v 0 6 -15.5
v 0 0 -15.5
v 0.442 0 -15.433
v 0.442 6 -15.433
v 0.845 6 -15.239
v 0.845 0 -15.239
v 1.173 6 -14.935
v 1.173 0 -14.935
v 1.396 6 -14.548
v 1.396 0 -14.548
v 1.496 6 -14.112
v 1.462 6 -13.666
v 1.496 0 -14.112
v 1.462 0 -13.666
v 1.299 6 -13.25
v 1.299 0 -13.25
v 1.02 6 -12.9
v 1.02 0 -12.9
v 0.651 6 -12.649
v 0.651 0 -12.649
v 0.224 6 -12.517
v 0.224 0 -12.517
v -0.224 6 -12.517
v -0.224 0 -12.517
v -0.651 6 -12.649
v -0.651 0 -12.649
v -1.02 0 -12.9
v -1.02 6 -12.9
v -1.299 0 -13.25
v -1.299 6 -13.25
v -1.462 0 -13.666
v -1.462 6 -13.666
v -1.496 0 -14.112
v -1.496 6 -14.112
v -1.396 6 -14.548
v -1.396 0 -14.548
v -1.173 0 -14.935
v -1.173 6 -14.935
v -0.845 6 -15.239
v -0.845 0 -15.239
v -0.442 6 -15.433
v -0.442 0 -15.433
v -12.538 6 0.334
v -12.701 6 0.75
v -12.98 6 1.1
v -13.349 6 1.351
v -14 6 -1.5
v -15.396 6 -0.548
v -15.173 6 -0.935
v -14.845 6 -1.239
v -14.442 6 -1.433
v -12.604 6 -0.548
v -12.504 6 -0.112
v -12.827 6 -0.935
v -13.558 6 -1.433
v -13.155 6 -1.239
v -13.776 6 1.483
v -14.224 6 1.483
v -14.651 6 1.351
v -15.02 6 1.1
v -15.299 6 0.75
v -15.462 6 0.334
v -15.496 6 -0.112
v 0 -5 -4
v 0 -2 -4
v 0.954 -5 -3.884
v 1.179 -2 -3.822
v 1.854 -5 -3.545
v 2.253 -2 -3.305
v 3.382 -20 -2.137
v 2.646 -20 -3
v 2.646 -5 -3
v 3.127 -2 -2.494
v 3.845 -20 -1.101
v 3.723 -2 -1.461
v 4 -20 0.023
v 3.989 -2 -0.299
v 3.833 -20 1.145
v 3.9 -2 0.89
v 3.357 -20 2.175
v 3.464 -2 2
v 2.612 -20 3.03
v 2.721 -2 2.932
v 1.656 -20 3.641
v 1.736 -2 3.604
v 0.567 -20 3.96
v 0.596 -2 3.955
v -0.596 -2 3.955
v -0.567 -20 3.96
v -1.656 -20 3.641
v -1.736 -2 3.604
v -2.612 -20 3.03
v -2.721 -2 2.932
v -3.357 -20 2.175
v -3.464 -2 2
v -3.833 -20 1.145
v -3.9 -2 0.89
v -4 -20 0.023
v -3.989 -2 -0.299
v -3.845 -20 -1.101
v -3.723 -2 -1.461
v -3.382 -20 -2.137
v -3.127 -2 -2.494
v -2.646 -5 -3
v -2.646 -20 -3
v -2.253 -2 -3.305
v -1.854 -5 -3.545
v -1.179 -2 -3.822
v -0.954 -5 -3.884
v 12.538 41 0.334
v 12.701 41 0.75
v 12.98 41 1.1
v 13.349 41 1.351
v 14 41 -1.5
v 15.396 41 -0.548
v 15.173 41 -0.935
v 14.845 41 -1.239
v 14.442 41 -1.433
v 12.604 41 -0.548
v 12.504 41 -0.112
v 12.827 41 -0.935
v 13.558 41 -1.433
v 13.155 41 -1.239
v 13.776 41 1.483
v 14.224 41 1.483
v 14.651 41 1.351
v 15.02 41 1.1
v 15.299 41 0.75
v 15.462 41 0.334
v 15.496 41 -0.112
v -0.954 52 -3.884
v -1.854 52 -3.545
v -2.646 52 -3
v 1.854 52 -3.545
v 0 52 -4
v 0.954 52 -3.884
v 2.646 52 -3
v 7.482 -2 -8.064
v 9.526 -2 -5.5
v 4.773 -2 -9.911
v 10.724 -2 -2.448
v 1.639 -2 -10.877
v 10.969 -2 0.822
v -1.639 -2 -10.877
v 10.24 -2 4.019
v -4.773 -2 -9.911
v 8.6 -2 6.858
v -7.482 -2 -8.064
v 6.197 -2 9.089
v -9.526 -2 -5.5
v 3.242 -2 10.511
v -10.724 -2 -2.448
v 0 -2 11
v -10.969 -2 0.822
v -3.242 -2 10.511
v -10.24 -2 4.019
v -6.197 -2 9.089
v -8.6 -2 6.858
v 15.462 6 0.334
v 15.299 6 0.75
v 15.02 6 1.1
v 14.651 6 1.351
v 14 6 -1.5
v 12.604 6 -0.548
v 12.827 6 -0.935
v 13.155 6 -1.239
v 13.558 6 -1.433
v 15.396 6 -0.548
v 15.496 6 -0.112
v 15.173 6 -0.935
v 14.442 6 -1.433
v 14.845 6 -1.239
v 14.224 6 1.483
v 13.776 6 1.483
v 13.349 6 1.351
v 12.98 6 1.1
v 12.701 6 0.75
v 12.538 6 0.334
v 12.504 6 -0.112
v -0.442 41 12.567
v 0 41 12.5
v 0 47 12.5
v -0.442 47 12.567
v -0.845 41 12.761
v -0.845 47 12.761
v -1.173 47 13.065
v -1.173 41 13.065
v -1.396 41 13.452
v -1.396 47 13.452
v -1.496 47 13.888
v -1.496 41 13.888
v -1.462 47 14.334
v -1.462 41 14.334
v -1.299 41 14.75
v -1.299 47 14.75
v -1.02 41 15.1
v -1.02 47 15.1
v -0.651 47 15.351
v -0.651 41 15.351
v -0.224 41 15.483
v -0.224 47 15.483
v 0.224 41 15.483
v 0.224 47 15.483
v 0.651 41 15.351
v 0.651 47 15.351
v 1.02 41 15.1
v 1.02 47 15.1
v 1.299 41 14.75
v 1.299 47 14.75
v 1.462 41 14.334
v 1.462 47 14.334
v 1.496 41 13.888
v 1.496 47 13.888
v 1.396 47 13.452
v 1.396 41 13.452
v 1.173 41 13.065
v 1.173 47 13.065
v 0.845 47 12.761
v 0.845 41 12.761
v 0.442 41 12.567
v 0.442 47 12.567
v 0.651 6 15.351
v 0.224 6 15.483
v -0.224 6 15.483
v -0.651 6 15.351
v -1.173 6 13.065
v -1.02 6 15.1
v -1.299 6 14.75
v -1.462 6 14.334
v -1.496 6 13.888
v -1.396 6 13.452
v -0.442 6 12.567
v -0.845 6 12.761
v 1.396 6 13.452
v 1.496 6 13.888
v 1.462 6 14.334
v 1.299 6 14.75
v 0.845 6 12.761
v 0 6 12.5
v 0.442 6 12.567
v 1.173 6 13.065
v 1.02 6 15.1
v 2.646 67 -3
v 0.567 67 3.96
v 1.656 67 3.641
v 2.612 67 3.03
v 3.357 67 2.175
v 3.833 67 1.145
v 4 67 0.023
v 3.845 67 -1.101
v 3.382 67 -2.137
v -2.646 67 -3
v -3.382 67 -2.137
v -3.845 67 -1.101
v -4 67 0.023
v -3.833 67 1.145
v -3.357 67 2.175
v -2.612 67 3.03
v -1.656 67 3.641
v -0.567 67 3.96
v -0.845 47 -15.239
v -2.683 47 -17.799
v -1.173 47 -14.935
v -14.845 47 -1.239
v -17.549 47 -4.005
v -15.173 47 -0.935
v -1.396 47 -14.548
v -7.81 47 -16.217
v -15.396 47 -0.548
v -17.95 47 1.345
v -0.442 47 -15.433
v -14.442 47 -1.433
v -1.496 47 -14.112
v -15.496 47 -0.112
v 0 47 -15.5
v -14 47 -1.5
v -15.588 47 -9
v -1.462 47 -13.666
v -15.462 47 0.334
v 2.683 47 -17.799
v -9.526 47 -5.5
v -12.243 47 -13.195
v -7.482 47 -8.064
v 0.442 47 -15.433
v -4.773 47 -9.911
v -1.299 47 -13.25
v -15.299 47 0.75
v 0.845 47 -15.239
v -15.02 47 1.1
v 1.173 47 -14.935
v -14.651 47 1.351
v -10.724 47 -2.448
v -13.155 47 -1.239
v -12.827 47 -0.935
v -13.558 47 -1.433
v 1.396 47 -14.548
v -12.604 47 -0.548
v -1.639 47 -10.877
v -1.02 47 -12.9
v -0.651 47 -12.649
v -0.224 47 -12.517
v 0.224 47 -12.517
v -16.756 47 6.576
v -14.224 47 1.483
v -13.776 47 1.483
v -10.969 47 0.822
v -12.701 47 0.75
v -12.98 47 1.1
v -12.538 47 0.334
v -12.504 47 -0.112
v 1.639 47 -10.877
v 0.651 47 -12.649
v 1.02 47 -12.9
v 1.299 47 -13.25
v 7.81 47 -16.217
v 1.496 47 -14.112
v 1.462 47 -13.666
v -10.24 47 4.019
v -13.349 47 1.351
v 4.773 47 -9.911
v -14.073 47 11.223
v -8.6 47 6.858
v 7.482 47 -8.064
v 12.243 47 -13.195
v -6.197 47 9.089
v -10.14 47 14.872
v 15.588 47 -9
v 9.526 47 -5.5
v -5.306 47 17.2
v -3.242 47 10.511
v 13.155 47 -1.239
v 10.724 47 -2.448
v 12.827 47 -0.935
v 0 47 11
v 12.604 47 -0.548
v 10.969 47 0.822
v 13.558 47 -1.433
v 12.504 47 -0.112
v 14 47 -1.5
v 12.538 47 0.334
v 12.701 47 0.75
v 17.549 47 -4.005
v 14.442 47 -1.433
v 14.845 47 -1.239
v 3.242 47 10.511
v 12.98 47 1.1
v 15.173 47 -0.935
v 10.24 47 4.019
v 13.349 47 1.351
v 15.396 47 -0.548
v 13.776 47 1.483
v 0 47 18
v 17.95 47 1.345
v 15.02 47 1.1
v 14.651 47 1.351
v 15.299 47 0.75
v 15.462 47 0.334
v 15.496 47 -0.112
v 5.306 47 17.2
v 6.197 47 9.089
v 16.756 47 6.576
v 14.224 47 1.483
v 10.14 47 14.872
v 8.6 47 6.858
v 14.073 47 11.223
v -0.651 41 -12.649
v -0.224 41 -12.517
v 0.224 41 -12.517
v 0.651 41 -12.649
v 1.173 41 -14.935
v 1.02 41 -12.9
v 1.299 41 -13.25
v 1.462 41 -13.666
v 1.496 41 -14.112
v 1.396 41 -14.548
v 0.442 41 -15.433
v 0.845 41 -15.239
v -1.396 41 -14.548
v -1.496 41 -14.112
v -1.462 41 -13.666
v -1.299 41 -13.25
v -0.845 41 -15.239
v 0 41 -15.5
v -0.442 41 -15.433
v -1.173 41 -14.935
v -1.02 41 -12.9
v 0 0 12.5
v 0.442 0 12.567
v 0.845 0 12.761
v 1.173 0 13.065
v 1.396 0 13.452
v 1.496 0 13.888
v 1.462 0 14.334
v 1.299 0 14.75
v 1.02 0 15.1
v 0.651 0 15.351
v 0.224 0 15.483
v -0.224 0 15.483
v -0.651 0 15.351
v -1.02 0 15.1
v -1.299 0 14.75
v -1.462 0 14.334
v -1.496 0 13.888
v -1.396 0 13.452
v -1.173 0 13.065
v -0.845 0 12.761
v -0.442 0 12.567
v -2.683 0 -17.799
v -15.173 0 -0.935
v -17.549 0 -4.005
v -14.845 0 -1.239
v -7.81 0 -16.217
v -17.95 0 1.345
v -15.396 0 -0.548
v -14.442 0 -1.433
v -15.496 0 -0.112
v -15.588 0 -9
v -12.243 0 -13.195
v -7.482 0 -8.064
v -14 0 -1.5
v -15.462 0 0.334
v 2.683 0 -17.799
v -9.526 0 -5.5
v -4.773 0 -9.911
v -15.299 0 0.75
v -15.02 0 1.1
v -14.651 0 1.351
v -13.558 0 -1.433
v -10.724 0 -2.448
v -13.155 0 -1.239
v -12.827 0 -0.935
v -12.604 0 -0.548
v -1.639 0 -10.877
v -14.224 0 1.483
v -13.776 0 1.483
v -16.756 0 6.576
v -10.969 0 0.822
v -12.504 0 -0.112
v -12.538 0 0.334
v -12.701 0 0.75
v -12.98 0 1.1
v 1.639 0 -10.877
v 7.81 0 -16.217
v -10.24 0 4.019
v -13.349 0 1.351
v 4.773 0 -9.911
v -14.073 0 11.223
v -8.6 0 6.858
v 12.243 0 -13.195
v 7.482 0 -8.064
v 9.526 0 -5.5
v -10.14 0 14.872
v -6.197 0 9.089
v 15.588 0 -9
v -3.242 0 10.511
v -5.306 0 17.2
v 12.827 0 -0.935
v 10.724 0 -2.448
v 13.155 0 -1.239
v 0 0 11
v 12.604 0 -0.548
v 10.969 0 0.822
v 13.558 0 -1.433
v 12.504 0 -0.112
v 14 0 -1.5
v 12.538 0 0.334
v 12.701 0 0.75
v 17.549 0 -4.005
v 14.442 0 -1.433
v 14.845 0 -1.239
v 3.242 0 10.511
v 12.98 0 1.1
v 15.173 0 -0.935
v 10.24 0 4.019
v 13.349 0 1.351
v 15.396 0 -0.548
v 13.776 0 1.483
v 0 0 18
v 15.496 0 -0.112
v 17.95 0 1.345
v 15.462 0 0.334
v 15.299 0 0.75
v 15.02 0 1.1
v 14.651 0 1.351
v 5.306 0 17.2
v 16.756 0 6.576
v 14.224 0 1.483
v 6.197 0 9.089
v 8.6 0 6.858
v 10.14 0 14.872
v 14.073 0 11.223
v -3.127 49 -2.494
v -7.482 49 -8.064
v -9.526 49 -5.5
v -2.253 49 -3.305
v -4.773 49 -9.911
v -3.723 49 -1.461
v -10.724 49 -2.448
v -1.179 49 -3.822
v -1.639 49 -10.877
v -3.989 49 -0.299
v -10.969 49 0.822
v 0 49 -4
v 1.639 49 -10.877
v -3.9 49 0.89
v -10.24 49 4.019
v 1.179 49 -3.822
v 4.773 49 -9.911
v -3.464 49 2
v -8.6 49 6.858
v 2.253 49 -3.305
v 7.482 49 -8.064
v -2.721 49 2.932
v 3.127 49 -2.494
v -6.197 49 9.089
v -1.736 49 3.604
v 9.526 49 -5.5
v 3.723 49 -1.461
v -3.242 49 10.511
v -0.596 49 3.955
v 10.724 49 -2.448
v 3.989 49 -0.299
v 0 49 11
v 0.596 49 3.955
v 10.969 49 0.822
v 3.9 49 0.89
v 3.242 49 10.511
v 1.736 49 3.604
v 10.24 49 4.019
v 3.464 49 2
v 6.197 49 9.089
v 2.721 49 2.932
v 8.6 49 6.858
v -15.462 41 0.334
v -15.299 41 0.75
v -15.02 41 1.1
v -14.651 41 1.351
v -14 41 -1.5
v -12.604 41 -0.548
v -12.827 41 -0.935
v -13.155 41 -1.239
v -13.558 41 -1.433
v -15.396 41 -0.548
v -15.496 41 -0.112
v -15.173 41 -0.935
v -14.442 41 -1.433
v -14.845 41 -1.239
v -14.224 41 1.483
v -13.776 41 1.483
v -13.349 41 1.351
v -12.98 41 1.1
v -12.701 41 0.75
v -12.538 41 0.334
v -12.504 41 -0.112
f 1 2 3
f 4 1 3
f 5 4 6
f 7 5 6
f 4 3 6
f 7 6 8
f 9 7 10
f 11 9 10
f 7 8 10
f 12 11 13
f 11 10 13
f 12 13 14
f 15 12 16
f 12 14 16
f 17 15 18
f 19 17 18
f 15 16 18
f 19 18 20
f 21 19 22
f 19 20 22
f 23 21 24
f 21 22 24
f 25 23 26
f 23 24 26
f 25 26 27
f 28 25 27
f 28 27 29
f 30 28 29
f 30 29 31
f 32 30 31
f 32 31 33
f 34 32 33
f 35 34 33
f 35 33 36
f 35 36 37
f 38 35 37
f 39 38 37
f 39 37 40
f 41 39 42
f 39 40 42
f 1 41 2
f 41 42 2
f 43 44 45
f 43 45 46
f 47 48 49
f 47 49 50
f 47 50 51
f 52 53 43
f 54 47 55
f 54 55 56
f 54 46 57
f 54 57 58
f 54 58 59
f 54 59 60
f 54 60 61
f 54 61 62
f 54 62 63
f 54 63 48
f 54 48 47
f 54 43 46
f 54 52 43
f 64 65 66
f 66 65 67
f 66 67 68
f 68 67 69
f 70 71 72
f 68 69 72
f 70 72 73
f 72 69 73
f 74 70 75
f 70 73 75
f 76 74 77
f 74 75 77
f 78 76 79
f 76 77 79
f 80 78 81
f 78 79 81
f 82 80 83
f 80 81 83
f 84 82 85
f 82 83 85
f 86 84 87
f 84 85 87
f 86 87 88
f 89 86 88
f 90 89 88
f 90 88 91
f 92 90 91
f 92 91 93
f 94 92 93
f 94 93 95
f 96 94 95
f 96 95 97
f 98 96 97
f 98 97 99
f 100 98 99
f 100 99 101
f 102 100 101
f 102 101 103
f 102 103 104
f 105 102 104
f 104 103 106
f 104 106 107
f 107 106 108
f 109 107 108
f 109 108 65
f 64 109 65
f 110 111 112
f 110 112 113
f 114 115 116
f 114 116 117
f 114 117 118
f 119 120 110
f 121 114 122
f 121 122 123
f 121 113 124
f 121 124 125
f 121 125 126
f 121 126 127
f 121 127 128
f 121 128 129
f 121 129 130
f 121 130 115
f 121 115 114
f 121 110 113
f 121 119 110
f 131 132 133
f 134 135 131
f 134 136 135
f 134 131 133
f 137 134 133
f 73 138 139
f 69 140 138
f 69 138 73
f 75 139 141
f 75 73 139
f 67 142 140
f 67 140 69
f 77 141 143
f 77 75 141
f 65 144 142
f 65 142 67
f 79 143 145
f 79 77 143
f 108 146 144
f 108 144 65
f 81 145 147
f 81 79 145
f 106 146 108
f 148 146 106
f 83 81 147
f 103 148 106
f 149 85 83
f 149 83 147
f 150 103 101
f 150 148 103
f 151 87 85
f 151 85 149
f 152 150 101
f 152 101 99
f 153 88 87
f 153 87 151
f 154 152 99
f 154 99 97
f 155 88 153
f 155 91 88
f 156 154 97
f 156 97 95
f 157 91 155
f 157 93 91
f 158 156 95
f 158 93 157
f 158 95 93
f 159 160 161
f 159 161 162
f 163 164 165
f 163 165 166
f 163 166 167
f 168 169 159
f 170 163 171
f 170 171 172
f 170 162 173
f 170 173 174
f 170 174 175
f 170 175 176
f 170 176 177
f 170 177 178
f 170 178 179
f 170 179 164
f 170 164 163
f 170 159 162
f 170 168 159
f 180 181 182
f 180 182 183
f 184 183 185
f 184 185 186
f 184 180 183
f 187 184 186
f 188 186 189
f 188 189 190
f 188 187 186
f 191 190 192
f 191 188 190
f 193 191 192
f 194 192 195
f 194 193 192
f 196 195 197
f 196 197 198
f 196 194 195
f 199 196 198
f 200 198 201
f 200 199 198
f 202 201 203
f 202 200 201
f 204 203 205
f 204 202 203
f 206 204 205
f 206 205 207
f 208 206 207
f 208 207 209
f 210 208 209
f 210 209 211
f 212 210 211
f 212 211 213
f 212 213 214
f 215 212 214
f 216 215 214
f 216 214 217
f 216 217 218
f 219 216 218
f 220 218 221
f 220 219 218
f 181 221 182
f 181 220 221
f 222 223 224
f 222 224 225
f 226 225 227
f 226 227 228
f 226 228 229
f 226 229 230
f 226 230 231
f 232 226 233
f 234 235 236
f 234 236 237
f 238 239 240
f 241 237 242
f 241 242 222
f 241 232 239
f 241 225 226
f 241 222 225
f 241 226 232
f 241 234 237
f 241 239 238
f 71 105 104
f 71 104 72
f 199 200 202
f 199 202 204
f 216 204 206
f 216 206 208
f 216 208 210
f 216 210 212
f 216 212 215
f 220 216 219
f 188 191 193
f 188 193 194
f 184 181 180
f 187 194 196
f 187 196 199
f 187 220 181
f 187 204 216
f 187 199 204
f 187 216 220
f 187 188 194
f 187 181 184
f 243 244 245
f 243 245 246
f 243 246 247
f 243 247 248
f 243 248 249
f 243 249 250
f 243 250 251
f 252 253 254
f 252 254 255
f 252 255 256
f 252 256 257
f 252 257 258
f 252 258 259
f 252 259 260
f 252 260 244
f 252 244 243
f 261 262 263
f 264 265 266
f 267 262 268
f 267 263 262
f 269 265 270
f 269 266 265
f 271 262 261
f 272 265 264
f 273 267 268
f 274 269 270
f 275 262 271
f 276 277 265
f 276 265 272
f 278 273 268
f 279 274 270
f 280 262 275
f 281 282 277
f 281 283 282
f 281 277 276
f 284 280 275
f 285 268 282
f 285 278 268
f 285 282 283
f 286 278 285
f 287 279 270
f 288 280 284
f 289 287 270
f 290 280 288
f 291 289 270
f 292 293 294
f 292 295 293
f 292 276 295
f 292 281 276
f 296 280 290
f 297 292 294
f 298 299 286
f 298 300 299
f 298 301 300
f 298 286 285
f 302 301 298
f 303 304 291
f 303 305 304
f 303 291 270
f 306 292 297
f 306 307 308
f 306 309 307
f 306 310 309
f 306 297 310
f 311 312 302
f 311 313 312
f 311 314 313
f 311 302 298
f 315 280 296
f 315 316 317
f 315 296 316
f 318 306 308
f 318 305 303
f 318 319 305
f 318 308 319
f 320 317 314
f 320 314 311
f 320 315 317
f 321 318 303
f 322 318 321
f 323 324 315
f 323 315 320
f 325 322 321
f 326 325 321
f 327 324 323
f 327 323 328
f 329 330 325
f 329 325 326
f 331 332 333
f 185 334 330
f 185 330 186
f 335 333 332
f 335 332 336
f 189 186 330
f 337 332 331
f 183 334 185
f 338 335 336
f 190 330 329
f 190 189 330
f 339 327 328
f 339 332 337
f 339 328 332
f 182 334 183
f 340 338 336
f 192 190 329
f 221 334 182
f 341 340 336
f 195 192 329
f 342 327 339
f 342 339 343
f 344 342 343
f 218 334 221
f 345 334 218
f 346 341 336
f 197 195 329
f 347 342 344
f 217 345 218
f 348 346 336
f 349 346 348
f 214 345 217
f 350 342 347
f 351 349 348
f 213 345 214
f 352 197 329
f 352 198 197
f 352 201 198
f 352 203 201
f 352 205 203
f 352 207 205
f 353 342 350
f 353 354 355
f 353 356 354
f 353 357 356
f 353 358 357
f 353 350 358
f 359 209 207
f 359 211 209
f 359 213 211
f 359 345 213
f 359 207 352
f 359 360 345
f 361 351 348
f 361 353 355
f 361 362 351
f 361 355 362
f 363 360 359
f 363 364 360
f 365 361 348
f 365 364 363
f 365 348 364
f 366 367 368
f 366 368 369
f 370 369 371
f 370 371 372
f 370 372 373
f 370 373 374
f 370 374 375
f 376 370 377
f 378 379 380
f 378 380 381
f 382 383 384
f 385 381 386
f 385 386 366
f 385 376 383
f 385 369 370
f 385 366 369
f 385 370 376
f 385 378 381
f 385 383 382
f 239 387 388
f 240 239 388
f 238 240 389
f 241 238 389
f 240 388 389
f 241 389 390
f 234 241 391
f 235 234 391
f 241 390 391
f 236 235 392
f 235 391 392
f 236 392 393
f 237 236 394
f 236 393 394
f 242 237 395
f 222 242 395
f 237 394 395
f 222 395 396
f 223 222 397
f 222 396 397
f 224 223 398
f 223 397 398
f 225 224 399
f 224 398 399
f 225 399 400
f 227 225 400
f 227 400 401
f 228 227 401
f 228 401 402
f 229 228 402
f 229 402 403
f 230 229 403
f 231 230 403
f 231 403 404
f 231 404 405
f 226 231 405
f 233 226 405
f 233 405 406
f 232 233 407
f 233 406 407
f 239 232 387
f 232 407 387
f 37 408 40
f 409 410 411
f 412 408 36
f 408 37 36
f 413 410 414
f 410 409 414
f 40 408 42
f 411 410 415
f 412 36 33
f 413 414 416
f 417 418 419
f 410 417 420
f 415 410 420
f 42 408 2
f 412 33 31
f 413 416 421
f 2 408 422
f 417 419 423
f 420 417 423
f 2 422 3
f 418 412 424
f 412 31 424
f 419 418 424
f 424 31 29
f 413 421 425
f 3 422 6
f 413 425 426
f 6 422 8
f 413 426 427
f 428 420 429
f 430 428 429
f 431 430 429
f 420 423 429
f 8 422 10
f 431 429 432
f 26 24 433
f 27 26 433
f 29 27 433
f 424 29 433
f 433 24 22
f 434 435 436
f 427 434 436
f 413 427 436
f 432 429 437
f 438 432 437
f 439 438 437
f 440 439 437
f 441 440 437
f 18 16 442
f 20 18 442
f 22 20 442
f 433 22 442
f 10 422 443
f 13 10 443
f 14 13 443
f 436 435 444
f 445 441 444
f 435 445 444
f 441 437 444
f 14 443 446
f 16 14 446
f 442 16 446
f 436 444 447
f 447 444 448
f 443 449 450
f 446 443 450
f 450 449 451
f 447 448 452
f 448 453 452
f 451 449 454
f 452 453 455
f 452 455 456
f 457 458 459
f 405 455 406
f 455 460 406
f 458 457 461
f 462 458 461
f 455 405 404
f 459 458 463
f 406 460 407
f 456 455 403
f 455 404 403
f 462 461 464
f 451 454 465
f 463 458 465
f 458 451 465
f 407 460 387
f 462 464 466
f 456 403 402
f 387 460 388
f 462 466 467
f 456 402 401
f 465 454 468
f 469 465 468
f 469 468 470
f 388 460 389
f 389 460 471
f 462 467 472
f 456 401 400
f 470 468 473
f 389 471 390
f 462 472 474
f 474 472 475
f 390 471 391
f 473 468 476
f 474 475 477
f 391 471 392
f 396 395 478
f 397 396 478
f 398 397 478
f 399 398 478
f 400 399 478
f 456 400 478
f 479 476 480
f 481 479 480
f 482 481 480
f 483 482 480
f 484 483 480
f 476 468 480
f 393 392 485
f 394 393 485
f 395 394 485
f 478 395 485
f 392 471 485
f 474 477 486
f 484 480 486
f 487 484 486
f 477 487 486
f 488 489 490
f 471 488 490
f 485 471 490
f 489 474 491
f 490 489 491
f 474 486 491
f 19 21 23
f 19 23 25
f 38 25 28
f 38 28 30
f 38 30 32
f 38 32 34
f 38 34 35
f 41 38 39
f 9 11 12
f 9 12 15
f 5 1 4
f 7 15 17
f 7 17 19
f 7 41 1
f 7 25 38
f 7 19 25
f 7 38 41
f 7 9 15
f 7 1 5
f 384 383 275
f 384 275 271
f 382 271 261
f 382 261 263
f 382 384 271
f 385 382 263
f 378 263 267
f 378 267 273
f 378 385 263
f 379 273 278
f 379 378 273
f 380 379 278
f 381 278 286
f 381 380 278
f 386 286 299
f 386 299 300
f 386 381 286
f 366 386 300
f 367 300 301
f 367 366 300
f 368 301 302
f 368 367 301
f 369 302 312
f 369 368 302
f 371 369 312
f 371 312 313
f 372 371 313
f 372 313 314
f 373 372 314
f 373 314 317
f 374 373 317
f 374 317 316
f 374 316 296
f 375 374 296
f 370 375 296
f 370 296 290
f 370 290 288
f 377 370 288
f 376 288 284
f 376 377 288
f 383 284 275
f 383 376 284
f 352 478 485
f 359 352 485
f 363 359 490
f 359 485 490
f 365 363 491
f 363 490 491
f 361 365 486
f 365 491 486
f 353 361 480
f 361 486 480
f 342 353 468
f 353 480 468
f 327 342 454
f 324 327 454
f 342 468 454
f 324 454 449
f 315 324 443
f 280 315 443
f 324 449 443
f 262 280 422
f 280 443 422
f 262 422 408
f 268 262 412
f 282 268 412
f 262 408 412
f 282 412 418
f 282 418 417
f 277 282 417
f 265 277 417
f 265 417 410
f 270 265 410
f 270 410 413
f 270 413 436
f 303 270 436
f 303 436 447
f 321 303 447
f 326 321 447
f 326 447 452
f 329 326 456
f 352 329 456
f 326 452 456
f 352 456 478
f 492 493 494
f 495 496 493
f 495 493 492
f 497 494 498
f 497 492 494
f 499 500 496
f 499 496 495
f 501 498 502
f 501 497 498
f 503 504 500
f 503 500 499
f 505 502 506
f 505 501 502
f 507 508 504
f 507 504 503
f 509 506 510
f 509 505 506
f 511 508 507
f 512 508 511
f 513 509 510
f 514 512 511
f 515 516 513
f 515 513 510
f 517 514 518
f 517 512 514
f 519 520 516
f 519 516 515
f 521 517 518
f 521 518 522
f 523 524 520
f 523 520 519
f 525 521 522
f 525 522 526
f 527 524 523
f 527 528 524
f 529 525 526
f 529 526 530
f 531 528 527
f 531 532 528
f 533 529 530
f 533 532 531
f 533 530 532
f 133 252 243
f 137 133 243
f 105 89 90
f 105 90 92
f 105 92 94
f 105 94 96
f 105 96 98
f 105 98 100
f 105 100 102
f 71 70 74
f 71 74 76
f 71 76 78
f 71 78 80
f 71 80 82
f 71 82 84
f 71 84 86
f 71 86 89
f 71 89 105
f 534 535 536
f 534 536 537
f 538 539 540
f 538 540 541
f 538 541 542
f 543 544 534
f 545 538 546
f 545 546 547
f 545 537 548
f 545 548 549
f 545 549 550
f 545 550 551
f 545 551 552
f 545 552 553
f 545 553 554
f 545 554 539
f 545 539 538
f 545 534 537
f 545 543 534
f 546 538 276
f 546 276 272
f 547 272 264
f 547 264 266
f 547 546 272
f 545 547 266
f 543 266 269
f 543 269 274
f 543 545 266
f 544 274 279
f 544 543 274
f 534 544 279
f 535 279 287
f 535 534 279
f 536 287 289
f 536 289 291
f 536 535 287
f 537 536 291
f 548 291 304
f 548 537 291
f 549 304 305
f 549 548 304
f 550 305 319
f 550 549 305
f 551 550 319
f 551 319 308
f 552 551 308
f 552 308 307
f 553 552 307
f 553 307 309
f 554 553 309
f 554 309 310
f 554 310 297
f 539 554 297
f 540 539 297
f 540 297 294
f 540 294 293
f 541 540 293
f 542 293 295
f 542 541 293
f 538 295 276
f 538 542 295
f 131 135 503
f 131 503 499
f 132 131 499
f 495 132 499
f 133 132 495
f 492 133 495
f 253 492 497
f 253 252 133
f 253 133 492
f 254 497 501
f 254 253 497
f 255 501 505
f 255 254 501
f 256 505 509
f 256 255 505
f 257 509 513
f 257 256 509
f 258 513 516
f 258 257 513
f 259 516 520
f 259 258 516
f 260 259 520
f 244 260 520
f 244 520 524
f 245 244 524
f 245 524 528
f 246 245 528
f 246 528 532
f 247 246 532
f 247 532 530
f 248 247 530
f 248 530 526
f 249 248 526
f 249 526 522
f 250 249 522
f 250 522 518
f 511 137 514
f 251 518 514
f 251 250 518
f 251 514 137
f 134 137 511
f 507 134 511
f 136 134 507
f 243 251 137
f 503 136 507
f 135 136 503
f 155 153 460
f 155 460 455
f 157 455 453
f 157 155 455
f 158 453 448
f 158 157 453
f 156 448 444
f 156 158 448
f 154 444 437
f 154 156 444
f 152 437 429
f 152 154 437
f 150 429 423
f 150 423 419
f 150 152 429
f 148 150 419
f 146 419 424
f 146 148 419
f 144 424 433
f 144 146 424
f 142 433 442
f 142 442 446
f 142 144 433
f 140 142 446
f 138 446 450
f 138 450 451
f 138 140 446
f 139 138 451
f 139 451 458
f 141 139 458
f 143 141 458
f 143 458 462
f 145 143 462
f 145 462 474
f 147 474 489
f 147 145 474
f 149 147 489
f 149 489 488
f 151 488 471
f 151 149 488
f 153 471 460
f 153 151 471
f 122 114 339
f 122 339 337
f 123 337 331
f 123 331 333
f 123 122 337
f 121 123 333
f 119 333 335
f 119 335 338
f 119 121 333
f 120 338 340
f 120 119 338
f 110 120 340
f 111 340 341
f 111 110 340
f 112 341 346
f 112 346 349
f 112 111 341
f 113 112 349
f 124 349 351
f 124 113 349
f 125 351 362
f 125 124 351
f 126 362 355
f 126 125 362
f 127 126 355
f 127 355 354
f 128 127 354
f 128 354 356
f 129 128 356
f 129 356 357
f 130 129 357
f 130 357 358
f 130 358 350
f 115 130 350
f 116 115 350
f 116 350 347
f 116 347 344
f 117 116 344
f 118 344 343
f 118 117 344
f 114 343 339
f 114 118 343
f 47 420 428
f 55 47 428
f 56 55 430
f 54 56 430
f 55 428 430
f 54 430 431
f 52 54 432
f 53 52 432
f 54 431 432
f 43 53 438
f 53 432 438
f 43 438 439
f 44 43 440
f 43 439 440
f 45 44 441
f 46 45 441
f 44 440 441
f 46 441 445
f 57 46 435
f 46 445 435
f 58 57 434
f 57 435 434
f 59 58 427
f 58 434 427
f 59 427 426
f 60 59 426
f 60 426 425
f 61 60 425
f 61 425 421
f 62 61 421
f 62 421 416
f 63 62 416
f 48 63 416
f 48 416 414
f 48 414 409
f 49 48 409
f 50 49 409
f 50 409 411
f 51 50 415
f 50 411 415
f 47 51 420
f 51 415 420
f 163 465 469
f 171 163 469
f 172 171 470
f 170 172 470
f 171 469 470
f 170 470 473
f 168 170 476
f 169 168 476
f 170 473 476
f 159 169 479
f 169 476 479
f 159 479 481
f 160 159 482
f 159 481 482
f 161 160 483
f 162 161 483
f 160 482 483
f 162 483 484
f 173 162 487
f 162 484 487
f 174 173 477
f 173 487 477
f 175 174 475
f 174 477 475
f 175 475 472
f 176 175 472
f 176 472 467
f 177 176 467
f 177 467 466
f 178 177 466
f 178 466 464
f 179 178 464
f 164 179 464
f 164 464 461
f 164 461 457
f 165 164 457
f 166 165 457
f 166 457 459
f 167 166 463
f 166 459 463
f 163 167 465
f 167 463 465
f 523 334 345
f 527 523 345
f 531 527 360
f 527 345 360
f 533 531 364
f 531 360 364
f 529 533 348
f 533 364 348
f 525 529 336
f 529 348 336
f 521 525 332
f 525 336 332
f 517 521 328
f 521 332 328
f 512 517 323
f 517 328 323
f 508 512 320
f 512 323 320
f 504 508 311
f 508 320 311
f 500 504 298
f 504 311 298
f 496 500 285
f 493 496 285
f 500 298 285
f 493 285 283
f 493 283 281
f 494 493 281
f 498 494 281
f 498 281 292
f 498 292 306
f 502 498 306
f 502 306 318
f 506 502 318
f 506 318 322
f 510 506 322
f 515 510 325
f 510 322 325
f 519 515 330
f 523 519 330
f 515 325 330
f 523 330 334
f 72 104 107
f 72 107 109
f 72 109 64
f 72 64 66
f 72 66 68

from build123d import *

# Parameters (mm, degrees)
SKETCH_1_R          = 18
EXTRUDE_1_DEPTH     = 47
SKETCH_2_R          = 11
EXTRUDE_2_DEPTH     = 2
EXTRUDE_START       = 2
SKETCH_3_R          = 11
EXTRUDE_3_DEPTH     = 2
SKETCH_4_R          = 4
EXTRUDE_4_DEPTH     = 18
EXTRUDE_START_2     = 18
SKETCH_5_R          = 4
EXTRUDE_5_DEPTH     = 18
SKETCH_6_W          = 9.252434457
SKETCH_6_H          = 4.602247191
CUT_EXTRUDE_1_DEPTH = 15
SKETCH_7_W          = 9.252434457
SKETCH_7_H          = 4.602247191
CUT_EXTRUDE_2_DEPTH = 15
SKETCH_8_R          = 1.5
CUT_EXTRUDE_3_DEPTH = 6
CUT_EXTRUDE_START   = -6
SKETCH_9_R          = 1.5
CUT_EXTRUDE_4_DEPTH = 6


with BuildPart() as part:
    # 草图1 → 凸台-拉伸1 (new body)
    with BuildSketch(Plane(origin=(0, 0, 0), x_dir=(1, 0, 0), z_dir=(0, 1, 0))):
        with Locations(Location((0, 0, 0), (0, 0, 270))):
            Circle(SKETCH_1_R)
    extrude(amount=EXTRUDE_1_DEPTH)

    # 草图2 → 凸台-拉伸2 (add)
    with BuildSketch(Plane(origin=(0, 47, 0), x_dir=(1, 0, 0), z_dir=(0, 1, 0))):
        with Locations(Location((0, 0, 0), (0, 0, 270))):
            Circle(SKETCH_2_R)
    extrude(amount=EXTRUDE_2_DEPTH)

    # 草图3 → 凸台-拉伸3 (add)
    with BuildSketch(Plane.XZ.offset(EXTRUDE_START)):
        with Locations(Location((0, 0, 0), (0, 0, 90))):
            Circle(SKETCH_3_R)
    extrude(amount=-EXTRUDE_3_DEPTH)

    # 草图4 → 凸台-拉伸4 (add)
    with BuildSketch(Plane.XZ.offset(2)):
        with Locations(Location((0, 0, 0), (0, 0, 270))):
            Circle(SKETCH_4_R)
    extrude(amount=EXTRUDE_4_DEPTH)

    # 草图5 → 凸台-拉伸5 (add)
    with BuildSketch(Plane(origin=(0, 49, 0), x_dir=(1, 0, 0), z_dir=(0, 1, 0)).offset(EXTRUDE_START_2)):
        with Locations(Location((0, 0, 0), (0, 0, 90))):
            Circle(SKETCH_5_R)
    extrude(amount=-EXTRUDE_5_DEPTH)

    # 草图6 → 切除-拉伸1 (cut)
    with BuildSketch(Plane(origin=(0, 67, 0), x_dir=(1, 0, 0), z_dir=(0, 1, 0))):
        with Locations((-0.167790263, 5.301123596)):
            Rectangle(SKETCH_6_W, SKETCH_6_H)
    extrude(amount=-CUT_EXTRUDE_1_DEPTH, mode=Mode.SUBTRACT)

    # 草图7 → 切除-拉伸2 (cut)
    with BuildSketch(Plane.XZ.offset(20)):
        with Locations((-0.167790263, -5.301123596)):
            Rectangle(SKETCH_7_W, SKETCH_7_H)
    extrude(amount=-CUT_EXTRUDE_2_DEPTH, mode=Mode.SUBTRACT)

    # 草图8 → 切除-拉伸3 (cut)
    with BuildSketch(Plane.XZ):
        with Locations(Location((0, 14, 0), (0, 0, 270))):
            Circle(SKETCH_8_R)
        with Locations(Location((14, 0, 0), (0, 0, 270))):
            Circle(SKETCH_8_R)
        with Locations(Location((0, -14, 0), (0, 0, 270))):
            Circle(SKETCH_8_R)
        with Locations(Location((-14, 0, 0), (0, 0, 270))):
            Circle(SKETCH_8_R)
    extrude(amount=-CUT_EXTRUDE_3_DEPTH, mode=Mode.SUBTRACT)

    # 草图9 → 切除-拉伸4 (cut)
    with BuildSketch(Plane(origin=(0, 47, 0), x_dir=(1, 0, 0), z_dir=(0, 1, 0)).offset(CUT_EXTRUDE_START)):
        with Locations(Location((-14, 0, 0), (0, 0, 90))):
            Circle(SKETCH_9_R)
        with Locations(Location((0, 14, 0), (0, 0, 90))):
            Circle(SKETCH_9_R)
        with Locations(Location((14, 0, 0), (0, 0, 90))):
            Circle(SKETCH_9_R)
        with Locations(Location((0, -14, 0), (0, 0, 90))):
            Circle(SKETCH_9_R)
    extrude(amount=CUT_EXTRUDE_4_DEPTH, mode=Mode.SUBTRACT)


solid = part.part
